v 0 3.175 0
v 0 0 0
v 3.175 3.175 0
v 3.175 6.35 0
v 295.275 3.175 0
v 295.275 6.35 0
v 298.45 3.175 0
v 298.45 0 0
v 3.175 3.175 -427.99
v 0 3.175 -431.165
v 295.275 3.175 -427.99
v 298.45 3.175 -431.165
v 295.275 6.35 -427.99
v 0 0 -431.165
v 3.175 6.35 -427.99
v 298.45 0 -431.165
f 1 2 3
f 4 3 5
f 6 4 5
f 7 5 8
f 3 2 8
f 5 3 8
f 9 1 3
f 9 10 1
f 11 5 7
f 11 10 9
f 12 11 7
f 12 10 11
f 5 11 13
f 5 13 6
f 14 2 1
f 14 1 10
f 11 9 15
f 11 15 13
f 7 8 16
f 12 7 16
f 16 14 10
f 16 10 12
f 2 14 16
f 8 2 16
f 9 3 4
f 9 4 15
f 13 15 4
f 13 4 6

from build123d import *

# Parameters (mm, degrees)
SKETCH1_W               = 298.45
SKETCH1_H               = 431.165
BOSS_EXTRUDE1_DEPTH     = 6.35
CUT_EXTRUDE1_DEPTH      = 525.419662317
CUT_EXTRUDE1_DEPTH_BACK = 3.175


with BuildPart() as part:
    # Sketch1 → Boss-Extrude1 (new body)
    with BuildSketch(Plane(origin=(0, 0, 0), x_dir=(1, 0, 0), z_dir=(0, 1, 0))):
        with Locations((149.225, 215.5825)):
            Rectangle(SKETCH1_W, SKETCH1_H)
    extrude(amount=BOSS_EXTRUDE1_DEPTH)

    # Sketch2 → Cut-Extrude1 (cut, two sides: drawn at the far end of the back side and taken through both)
    with BuildSketch(Plane(origin=(0, 6.35, 0), x_dir=(1, 0, 0), z_dir=(0, 1, 0)).offset(-CUT_EXTRUDE1_DEPTH_BACK)):
        Polygon((0, 0), (3.175, 0), (3.175, 427.99), (295.275, 427.99), (295.275, 0), (298.45, 0), (298.45, 431.165), (0, 431.165), align=None)
    extrude(amount=CUT_EXTRUDE1_DEPTH + CUT_EXTRUDE1_DEPTH_BACK, mode=Mode.SUBTRACT)


solid = part.part
